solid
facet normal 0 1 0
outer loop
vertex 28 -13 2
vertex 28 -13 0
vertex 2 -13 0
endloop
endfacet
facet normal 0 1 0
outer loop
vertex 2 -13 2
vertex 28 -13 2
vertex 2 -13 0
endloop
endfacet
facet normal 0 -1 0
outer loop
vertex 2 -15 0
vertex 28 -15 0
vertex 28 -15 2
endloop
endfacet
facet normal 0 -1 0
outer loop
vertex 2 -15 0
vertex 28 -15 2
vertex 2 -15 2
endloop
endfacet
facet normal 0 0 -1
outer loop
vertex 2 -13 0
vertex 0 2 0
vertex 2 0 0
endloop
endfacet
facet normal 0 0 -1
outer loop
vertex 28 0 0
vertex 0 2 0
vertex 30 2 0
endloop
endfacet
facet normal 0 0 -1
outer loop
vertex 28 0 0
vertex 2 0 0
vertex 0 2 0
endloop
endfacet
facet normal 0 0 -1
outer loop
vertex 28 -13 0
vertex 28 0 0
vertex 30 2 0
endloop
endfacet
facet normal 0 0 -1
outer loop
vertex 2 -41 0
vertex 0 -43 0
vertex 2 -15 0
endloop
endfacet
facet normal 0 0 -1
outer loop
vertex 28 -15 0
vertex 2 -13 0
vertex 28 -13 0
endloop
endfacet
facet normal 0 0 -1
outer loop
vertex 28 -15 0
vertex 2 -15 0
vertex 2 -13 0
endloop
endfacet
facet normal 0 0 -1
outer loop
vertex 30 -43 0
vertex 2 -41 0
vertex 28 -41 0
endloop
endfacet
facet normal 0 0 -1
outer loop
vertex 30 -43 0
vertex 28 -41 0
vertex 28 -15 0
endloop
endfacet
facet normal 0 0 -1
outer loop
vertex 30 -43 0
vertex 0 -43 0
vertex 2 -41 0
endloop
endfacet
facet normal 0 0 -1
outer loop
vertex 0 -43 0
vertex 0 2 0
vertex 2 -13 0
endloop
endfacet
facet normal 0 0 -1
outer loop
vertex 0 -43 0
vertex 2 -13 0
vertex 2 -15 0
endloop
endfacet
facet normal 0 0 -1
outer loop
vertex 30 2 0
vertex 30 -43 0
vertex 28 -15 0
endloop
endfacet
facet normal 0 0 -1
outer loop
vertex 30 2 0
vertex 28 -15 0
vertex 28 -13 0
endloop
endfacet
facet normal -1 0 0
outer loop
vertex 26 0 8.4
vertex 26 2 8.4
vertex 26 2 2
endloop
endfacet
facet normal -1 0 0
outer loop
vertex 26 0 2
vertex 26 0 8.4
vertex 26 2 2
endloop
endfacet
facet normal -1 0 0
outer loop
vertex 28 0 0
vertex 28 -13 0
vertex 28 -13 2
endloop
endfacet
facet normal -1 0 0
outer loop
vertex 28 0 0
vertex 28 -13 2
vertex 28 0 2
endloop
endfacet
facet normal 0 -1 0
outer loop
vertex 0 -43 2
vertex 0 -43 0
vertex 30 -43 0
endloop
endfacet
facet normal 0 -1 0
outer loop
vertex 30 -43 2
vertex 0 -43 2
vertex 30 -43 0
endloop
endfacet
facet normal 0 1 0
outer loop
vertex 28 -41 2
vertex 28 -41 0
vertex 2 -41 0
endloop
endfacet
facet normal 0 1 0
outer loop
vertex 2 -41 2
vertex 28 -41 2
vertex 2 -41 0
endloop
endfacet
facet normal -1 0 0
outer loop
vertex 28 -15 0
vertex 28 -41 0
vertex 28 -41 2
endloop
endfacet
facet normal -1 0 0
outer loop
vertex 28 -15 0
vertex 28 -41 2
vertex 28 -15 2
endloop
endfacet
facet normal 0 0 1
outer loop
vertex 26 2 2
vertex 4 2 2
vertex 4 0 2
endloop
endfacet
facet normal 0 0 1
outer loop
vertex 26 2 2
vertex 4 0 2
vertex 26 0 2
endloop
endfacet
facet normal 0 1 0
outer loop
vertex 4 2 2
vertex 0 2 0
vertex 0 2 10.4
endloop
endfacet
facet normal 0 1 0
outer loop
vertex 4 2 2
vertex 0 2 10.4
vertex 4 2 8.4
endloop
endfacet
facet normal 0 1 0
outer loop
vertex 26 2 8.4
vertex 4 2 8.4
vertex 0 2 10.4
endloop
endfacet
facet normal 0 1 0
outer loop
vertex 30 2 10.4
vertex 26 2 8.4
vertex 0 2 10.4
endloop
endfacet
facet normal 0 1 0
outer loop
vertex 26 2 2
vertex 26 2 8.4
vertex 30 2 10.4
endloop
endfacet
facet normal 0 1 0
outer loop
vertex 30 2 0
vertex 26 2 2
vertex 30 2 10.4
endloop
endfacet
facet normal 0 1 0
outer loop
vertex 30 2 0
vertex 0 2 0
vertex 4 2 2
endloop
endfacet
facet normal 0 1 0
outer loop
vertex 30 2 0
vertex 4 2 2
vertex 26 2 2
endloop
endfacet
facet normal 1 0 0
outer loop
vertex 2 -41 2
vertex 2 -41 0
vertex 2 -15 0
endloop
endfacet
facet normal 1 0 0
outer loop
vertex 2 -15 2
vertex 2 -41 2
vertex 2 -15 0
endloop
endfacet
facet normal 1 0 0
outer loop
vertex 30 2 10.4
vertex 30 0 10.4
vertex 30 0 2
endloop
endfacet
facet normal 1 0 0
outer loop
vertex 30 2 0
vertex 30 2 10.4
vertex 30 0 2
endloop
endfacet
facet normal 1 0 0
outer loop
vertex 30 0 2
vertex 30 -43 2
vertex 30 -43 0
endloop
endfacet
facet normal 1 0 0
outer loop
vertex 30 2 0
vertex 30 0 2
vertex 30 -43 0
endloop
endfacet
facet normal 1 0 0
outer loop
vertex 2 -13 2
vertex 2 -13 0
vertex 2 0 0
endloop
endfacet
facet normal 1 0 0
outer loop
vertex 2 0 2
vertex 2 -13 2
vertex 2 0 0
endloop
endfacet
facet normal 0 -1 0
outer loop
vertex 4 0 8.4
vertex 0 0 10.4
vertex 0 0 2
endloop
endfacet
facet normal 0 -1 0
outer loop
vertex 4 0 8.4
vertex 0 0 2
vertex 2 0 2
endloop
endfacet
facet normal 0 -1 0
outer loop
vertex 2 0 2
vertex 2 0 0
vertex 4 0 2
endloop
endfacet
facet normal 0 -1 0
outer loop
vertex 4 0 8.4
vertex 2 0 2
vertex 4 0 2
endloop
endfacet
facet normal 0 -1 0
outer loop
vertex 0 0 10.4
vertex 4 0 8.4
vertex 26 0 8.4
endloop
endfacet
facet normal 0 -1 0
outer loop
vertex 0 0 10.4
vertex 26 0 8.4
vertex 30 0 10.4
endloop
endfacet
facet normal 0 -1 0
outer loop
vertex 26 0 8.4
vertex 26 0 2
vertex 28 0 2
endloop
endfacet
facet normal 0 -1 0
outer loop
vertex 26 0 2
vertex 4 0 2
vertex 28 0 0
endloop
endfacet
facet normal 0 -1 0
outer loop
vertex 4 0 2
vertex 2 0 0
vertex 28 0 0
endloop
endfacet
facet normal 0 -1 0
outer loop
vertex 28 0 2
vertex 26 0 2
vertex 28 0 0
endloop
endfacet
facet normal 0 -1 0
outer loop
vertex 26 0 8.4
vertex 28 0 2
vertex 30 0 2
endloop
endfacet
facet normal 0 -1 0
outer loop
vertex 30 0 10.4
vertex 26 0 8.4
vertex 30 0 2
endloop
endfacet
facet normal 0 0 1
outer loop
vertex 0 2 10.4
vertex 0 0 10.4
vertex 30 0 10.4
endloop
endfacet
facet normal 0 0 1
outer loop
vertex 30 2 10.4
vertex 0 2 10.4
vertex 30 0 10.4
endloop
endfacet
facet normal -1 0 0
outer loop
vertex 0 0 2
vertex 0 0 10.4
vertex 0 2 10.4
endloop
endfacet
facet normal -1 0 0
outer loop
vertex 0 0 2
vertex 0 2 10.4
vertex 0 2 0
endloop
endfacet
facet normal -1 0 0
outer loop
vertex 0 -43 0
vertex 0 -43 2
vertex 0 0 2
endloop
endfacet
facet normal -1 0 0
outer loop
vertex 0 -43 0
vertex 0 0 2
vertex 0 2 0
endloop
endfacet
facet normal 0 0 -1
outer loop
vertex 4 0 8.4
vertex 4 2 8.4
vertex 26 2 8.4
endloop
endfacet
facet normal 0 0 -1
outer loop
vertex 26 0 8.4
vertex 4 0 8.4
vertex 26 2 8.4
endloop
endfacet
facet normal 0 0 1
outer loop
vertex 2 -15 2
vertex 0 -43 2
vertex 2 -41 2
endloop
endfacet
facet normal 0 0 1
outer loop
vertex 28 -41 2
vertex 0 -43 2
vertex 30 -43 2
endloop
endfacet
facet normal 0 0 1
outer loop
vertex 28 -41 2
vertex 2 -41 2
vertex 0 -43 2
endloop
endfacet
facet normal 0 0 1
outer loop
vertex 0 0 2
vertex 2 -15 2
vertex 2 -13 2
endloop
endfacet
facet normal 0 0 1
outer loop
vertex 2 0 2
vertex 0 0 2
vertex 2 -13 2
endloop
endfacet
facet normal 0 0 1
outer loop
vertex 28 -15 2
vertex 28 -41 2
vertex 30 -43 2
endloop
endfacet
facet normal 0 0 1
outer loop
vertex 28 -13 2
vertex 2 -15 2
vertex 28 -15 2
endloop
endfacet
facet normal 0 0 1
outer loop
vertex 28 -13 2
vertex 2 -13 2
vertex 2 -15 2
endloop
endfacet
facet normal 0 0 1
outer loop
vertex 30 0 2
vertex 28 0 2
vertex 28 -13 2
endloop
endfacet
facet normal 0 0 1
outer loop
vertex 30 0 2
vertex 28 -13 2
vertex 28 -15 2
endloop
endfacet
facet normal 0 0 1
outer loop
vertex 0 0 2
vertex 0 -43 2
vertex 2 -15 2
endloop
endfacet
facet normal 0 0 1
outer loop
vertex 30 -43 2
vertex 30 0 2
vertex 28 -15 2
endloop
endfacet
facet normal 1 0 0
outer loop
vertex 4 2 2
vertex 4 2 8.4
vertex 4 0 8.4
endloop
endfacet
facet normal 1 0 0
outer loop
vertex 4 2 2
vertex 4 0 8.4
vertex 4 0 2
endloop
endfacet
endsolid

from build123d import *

# Parameters (mm, degrees)
SKETCH1_W           = 30
SKETCH1_H           = 10.4
BOSS_EXTRUDE1_DEPTH = 2
SKETCH2_W           = 22
SKETCH2_H           = 6.4
CUT_EXTRUDE1_DEPTH  = 3
SKETCH4_W           = 30
SKETCH4_H           = 2
BOSS_EXTRUDE2_DEPTH = 45
SKETCH5_W           = 26
SKETCH5_H           = 26
CUT_EXTRUDE3_DEPTH  = 11.4
SKETCH6_W           = 26
SKETCH6_H           = 13
CUT_EXTRUDE4_DEPTH  = 11.4


with BuildPart() as part:
    # Sketch1 → Boss-Extrude1 (new body)
    with BuildSketch(Plane(origin=(0, 0, 0), x_dir=(1, 0, 0), z_dir=(0, 1, 0))):
        with Locations((15, -5.2)):
            Rectangle(SKETCH1_W, SKETCH1_H)
    extrude(amount=BOSS_EXTRUDE1_DEPTH)

    # Sketch2 → Cut-Extrude1 (cut, through all)
    with BuildSketch(Plane(origin=(0, 2, 0), x_dir=(1, 0, 0), z_dir=(0, 1, 0))):
        with Locations((15, -5.2)):
            Rectangle(SKETCH2_W, SKETCH2_H)
    extrude(amount=-CUT_EXTRUDE1_DEPTH, mode=Mode.SUBTRACT)

    # Sketch4 → Boss-Extrude2 (add)
    with BuildSketch(Plane(origin=(0, 2, 0), x_dir=(1, 0, 0), z_dir=(0, 1, 0))):
        with Locations((15, -1)):
            Rectangle(SKETCH4_W, SKETCH4_H)
    extrude(amount=-BOSS_EXTRUDE2_DEPTH)

    # Sketch5 → Cut-Extrude3 (cut, through all)
    with BuildSketch(Plane(origin=(0, 0, 0), x_dir=(-1, 0, 0), z_dir=(0, 0, -1))):
        with Locations((-15, -28)):
            Rectangle(SKETCH5_W, SKETCH5_H)
    extrude(amount=-CUT_EXTRUDE3_DEPTH, mode=Mode.SUBTRACT)

    # Sketch6 → Cut-Extrude4 (cut, through all)
    with BuildSketch(Plane(origin=(0, 0, 0), x_dir=(-1, 0, 0), z_dir=(0, 0, -1))):
        with Locations((-15, -6.5)):
            Rectangle(SKETCH6_W, SKETCH6_H)
    extrude(amount=-CUT_EXTRUDE4_DEPTH, mode=Mode.SUBTRACT)


solid = part.part
